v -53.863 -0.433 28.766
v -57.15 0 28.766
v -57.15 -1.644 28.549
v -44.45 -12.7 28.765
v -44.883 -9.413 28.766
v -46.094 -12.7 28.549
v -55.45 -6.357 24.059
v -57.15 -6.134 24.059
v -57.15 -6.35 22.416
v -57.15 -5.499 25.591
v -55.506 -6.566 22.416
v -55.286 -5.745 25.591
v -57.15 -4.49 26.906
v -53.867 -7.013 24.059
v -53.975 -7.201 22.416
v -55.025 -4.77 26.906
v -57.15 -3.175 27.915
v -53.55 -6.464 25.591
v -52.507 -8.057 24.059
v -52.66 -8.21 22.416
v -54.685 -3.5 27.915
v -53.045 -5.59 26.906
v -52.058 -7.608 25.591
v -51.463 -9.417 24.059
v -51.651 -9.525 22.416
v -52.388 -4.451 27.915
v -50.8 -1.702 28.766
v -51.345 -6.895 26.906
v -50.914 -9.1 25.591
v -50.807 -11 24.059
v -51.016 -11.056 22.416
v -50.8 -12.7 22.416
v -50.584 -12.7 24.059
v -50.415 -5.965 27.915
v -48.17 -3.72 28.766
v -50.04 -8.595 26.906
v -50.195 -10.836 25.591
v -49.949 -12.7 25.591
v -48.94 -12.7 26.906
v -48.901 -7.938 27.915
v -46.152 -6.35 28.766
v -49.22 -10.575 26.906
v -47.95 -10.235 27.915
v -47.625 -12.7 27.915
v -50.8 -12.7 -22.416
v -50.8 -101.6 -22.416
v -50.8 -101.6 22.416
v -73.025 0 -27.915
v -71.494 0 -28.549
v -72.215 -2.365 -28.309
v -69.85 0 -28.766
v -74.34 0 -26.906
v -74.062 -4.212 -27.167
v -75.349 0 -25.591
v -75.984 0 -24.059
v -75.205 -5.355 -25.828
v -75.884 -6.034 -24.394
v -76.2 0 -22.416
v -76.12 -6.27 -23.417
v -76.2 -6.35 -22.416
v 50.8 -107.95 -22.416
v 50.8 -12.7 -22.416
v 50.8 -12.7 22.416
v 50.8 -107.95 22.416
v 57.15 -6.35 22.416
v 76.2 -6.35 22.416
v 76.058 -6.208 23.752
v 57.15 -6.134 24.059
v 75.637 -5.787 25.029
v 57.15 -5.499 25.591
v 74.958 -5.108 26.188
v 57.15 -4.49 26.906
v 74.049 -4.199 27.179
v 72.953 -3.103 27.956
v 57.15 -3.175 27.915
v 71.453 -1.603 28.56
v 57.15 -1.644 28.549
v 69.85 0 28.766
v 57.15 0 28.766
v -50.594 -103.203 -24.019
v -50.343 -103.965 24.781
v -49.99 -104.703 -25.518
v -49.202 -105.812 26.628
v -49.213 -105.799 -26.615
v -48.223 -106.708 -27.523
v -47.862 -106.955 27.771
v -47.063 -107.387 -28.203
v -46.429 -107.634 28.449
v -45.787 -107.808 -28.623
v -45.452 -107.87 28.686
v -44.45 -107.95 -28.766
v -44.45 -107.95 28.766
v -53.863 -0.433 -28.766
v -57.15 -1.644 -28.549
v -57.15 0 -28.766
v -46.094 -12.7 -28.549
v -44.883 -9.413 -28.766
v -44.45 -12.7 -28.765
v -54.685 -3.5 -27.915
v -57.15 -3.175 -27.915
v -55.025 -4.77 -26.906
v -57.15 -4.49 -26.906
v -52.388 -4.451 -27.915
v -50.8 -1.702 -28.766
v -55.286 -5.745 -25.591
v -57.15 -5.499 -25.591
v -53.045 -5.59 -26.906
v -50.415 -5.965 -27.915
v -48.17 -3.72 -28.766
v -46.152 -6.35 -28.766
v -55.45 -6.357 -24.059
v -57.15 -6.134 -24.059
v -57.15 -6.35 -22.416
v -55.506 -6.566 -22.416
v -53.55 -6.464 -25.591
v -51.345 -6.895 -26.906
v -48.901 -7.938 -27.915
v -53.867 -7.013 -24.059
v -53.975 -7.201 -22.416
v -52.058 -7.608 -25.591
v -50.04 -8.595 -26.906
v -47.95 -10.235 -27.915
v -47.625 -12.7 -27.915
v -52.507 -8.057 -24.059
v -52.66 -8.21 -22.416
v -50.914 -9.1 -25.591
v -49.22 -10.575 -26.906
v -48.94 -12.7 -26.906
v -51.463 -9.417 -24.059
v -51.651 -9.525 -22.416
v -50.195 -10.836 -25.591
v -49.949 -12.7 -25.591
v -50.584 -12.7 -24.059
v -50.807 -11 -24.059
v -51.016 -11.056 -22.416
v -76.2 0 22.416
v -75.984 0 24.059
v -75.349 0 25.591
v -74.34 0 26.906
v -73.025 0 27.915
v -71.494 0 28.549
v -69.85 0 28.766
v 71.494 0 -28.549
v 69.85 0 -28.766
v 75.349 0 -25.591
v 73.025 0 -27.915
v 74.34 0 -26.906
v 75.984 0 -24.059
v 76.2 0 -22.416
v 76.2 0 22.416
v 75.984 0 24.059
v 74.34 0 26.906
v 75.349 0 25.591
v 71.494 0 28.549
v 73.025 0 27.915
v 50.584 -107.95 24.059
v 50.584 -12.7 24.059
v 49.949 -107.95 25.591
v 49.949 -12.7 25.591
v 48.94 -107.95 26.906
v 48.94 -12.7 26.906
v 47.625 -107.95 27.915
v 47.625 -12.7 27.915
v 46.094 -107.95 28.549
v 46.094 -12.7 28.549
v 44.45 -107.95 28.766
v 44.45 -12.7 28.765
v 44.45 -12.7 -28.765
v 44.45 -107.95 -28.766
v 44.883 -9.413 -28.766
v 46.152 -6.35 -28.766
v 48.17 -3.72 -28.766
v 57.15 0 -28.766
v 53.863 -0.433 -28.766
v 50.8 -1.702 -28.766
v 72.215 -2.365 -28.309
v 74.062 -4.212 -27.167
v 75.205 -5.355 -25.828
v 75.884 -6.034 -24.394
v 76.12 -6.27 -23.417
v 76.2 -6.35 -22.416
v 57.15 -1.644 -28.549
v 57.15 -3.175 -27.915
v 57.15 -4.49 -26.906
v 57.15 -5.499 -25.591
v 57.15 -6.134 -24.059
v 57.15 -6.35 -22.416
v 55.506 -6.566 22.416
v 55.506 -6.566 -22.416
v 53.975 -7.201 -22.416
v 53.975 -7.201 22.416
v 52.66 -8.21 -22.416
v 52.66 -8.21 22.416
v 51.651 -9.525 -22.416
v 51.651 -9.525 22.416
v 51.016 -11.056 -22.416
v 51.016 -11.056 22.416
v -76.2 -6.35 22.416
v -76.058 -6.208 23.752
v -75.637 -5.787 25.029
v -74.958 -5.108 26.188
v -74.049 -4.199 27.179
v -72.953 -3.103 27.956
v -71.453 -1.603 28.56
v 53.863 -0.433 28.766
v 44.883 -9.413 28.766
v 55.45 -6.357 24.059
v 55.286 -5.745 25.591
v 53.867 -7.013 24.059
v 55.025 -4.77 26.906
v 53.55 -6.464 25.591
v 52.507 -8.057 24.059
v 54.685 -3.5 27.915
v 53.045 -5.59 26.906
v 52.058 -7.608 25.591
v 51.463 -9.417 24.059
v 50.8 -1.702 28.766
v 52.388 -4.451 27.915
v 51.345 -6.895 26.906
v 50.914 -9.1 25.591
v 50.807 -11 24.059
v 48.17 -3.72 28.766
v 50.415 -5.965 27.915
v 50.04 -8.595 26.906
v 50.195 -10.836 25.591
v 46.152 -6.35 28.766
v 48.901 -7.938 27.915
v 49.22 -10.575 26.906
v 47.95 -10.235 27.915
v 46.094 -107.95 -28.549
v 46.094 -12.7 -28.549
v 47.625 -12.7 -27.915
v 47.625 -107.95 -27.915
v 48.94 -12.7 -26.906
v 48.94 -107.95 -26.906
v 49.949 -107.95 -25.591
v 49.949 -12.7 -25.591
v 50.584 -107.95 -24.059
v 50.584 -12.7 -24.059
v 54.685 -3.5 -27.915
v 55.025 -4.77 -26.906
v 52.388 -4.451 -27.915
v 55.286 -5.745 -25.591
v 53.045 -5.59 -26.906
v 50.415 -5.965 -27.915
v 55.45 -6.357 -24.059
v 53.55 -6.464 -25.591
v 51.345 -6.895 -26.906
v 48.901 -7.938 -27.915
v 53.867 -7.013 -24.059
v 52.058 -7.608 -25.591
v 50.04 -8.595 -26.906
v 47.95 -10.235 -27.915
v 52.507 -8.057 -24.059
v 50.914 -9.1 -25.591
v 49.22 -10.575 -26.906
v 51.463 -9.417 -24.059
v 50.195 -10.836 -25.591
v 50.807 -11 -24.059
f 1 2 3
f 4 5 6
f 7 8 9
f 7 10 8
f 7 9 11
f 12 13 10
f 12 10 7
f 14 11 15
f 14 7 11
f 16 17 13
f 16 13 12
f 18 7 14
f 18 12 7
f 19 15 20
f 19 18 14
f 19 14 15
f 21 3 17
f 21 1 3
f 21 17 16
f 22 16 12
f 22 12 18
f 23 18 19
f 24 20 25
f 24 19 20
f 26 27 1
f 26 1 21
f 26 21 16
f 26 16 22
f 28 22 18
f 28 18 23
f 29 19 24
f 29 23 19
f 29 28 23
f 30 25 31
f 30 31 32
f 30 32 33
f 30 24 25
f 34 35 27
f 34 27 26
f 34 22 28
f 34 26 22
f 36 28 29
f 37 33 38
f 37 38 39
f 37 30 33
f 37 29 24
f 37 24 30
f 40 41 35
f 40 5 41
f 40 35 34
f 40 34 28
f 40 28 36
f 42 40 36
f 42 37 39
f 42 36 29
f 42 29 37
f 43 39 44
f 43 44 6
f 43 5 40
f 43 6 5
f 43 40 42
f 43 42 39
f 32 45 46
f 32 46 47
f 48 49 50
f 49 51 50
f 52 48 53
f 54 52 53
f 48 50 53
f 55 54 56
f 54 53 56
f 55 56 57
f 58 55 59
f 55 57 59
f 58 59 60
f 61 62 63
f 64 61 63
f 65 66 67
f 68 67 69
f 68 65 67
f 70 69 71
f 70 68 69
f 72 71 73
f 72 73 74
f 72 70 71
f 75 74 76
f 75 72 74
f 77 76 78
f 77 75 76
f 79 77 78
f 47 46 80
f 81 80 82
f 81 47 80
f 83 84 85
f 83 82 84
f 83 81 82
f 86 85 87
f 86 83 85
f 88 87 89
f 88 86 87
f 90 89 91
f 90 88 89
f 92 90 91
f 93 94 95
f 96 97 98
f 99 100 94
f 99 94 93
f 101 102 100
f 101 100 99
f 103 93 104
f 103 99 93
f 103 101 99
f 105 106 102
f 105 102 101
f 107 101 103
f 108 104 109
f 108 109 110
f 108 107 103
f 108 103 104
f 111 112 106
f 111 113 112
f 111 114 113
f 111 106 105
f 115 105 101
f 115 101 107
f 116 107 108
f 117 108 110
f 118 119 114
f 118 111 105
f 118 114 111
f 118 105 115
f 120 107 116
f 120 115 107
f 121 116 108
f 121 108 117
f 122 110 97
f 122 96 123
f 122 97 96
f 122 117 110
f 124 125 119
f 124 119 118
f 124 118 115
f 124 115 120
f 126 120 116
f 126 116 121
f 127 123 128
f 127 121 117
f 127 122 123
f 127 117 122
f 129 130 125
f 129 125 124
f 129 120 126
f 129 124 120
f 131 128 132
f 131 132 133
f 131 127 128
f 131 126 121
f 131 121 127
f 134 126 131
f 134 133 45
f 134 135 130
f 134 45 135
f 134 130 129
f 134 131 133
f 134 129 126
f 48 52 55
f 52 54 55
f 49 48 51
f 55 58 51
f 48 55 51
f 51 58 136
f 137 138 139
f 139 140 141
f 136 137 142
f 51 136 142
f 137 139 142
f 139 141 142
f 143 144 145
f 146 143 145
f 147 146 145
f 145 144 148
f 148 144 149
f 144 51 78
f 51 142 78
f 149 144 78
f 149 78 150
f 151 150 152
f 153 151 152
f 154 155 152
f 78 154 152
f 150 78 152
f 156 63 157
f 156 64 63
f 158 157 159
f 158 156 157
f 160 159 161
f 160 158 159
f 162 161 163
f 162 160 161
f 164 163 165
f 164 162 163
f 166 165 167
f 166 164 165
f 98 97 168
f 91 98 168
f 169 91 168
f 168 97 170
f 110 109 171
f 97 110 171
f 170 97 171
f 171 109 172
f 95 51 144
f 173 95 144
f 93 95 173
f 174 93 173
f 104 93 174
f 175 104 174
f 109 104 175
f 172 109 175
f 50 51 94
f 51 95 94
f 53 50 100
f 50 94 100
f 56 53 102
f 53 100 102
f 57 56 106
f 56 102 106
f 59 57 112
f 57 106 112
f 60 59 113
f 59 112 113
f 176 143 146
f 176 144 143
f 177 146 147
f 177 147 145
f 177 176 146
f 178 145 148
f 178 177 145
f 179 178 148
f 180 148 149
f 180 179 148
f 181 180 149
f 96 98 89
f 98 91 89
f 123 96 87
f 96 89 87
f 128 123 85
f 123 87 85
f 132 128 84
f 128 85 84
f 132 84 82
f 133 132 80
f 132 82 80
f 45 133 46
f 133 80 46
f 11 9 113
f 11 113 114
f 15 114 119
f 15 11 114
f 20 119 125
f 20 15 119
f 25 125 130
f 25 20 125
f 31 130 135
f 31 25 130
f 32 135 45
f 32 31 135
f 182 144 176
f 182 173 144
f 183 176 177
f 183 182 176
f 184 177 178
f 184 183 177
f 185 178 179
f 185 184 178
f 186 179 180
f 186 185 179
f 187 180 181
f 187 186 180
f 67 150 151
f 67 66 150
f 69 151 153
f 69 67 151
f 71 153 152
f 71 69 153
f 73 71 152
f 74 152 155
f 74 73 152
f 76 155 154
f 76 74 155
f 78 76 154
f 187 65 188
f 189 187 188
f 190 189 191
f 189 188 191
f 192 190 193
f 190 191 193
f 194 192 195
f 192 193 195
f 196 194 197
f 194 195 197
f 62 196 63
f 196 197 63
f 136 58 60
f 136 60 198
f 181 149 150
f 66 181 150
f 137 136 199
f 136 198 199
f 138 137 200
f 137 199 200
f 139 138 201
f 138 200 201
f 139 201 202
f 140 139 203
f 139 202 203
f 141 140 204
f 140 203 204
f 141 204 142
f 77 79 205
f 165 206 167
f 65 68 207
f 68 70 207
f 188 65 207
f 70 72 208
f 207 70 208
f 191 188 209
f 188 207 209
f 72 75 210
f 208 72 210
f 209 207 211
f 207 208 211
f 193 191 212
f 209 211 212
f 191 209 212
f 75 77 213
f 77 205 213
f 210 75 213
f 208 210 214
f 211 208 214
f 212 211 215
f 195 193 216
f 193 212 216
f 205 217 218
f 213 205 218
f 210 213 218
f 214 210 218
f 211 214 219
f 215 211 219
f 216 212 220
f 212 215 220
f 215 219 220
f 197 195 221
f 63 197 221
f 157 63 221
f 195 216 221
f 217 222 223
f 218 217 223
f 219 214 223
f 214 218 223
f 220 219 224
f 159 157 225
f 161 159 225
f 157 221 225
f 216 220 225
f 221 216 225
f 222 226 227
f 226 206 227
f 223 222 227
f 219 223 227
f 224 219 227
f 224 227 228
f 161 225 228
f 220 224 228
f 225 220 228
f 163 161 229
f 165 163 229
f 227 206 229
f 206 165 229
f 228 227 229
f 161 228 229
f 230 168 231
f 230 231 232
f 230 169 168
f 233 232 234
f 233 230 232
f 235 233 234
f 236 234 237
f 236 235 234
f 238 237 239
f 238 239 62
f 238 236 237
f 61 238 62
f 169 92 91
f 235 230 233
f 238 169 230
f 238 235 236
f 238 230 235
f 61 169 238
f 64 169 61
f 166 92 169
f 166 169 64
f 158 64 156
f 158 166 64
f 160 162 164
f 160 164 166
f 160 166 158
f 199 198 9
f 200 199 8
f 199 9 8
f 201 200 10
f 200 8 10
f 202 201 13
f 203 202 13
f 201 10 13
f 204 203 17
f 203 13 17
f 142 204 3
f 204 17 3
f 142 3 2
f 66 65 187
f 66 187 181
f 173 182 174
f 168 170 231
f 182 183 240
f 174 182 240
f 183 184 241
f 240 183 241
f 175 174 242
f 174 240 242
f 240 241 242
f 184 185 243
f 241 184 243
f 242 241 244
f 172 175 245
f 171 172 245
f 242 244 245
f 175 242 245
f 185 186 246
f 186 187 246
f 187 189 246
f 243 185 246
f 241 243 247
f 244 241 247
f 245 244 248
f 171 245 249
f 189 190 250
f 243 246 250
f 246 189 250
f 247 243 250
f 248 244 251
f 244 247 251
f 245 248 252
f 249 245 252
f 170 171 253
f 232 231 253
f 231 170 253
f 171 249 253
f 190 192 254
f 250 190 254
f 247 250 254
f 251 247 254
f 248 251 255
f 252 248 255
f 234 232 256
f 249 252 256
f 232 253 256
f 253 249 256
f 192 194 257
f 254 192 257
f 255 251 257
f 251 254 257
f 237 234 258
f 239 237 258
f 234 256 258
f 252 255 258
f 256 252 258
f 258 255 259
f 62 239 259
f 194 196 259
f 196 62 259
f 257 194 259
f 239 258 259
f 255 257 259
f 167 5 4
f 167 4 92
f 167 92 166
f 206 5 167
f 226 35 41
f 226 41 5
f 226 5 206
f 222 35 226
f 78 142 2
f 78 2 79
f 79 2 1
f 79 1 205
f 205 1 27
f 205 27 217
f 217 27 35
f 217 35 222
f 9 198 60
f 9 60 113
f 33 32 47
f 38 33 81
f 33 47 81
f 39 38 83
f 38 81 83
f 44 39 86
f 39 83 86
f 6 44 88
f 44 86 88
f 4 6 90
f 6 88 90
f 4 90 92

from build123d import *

# Parameters (mm, degrees)
F0_W     = 152.4
F0_H     = 57.531
F1_DEPTH = 6.35
F2_W     = 101.6
F2_H     = 57.531
F3_DEPTH = 101.6
F4_F1_R  = 6.35
F4_F2_R  = 6.3499


# Not quite as in the source:
# - a fillet or chamfer is up to 0.001 mm smaller than in the source, because OpenCascade refuses the exact size


with BuildPart() as f1:
    # F0 (on Front) → F1 (new body)
    with BuildSketch(Plane.XZ):
        Rectangle(F0_W, F0_H)
    extrude(amount=F1_DEPTH)

    # F2 (on face) → F3 (join)
    with BuildSketch(Plane.XZ.offset(6.35)):
        Rectangle(F2_W, F2_H)
    extrude(amount=F3_DEPTH)

    # F4: fillet of radius 6.35 on 11 edges, made by hand

    # F4_f1
    f4_f1_edges = [f1.edges().sort_by_distance(p)[0] for p in [
        (50.8, -6.35, 0),
        (-50.8, -6.35, 0),
    ]]
    fillet(f4_f1_edges, radius=F4_F1_R)

    # F4_f2 (radius 6.35 in the source; OpenCascade refuses exactly that, so slightly less here)
    f4_f2_edges = [f1.edges().sort_by_distance(p)[0] for p in [
        (-76.2, -3.175, -28.7655),
        (-50.8, -60.325, -28.7655),
        (-50.8, -60.325, 28.7655),
        (50.8, -60.325, -28.7655),
        (50.8, -60.325, 28.7655),
        (-50.8, -107.95, 0),
        (-76.2, -3.175, 28.7655),
        (76.2, -3.175, 28.7655),
        (76.2, -3.175, -28.7655),
        (52.6598719395, -8.2098719395, 28.7655),
        (52.6598719395, -8.2098719395, -28.7655),
        (-52.6598719395, -8.2098719395, 28.7655),
        (-52.6598719395, -8.2098719395, -28.7655),
    ]]
    fillet(f4_f2_edges, radius=F4_F2_R)


solid = f1.part
